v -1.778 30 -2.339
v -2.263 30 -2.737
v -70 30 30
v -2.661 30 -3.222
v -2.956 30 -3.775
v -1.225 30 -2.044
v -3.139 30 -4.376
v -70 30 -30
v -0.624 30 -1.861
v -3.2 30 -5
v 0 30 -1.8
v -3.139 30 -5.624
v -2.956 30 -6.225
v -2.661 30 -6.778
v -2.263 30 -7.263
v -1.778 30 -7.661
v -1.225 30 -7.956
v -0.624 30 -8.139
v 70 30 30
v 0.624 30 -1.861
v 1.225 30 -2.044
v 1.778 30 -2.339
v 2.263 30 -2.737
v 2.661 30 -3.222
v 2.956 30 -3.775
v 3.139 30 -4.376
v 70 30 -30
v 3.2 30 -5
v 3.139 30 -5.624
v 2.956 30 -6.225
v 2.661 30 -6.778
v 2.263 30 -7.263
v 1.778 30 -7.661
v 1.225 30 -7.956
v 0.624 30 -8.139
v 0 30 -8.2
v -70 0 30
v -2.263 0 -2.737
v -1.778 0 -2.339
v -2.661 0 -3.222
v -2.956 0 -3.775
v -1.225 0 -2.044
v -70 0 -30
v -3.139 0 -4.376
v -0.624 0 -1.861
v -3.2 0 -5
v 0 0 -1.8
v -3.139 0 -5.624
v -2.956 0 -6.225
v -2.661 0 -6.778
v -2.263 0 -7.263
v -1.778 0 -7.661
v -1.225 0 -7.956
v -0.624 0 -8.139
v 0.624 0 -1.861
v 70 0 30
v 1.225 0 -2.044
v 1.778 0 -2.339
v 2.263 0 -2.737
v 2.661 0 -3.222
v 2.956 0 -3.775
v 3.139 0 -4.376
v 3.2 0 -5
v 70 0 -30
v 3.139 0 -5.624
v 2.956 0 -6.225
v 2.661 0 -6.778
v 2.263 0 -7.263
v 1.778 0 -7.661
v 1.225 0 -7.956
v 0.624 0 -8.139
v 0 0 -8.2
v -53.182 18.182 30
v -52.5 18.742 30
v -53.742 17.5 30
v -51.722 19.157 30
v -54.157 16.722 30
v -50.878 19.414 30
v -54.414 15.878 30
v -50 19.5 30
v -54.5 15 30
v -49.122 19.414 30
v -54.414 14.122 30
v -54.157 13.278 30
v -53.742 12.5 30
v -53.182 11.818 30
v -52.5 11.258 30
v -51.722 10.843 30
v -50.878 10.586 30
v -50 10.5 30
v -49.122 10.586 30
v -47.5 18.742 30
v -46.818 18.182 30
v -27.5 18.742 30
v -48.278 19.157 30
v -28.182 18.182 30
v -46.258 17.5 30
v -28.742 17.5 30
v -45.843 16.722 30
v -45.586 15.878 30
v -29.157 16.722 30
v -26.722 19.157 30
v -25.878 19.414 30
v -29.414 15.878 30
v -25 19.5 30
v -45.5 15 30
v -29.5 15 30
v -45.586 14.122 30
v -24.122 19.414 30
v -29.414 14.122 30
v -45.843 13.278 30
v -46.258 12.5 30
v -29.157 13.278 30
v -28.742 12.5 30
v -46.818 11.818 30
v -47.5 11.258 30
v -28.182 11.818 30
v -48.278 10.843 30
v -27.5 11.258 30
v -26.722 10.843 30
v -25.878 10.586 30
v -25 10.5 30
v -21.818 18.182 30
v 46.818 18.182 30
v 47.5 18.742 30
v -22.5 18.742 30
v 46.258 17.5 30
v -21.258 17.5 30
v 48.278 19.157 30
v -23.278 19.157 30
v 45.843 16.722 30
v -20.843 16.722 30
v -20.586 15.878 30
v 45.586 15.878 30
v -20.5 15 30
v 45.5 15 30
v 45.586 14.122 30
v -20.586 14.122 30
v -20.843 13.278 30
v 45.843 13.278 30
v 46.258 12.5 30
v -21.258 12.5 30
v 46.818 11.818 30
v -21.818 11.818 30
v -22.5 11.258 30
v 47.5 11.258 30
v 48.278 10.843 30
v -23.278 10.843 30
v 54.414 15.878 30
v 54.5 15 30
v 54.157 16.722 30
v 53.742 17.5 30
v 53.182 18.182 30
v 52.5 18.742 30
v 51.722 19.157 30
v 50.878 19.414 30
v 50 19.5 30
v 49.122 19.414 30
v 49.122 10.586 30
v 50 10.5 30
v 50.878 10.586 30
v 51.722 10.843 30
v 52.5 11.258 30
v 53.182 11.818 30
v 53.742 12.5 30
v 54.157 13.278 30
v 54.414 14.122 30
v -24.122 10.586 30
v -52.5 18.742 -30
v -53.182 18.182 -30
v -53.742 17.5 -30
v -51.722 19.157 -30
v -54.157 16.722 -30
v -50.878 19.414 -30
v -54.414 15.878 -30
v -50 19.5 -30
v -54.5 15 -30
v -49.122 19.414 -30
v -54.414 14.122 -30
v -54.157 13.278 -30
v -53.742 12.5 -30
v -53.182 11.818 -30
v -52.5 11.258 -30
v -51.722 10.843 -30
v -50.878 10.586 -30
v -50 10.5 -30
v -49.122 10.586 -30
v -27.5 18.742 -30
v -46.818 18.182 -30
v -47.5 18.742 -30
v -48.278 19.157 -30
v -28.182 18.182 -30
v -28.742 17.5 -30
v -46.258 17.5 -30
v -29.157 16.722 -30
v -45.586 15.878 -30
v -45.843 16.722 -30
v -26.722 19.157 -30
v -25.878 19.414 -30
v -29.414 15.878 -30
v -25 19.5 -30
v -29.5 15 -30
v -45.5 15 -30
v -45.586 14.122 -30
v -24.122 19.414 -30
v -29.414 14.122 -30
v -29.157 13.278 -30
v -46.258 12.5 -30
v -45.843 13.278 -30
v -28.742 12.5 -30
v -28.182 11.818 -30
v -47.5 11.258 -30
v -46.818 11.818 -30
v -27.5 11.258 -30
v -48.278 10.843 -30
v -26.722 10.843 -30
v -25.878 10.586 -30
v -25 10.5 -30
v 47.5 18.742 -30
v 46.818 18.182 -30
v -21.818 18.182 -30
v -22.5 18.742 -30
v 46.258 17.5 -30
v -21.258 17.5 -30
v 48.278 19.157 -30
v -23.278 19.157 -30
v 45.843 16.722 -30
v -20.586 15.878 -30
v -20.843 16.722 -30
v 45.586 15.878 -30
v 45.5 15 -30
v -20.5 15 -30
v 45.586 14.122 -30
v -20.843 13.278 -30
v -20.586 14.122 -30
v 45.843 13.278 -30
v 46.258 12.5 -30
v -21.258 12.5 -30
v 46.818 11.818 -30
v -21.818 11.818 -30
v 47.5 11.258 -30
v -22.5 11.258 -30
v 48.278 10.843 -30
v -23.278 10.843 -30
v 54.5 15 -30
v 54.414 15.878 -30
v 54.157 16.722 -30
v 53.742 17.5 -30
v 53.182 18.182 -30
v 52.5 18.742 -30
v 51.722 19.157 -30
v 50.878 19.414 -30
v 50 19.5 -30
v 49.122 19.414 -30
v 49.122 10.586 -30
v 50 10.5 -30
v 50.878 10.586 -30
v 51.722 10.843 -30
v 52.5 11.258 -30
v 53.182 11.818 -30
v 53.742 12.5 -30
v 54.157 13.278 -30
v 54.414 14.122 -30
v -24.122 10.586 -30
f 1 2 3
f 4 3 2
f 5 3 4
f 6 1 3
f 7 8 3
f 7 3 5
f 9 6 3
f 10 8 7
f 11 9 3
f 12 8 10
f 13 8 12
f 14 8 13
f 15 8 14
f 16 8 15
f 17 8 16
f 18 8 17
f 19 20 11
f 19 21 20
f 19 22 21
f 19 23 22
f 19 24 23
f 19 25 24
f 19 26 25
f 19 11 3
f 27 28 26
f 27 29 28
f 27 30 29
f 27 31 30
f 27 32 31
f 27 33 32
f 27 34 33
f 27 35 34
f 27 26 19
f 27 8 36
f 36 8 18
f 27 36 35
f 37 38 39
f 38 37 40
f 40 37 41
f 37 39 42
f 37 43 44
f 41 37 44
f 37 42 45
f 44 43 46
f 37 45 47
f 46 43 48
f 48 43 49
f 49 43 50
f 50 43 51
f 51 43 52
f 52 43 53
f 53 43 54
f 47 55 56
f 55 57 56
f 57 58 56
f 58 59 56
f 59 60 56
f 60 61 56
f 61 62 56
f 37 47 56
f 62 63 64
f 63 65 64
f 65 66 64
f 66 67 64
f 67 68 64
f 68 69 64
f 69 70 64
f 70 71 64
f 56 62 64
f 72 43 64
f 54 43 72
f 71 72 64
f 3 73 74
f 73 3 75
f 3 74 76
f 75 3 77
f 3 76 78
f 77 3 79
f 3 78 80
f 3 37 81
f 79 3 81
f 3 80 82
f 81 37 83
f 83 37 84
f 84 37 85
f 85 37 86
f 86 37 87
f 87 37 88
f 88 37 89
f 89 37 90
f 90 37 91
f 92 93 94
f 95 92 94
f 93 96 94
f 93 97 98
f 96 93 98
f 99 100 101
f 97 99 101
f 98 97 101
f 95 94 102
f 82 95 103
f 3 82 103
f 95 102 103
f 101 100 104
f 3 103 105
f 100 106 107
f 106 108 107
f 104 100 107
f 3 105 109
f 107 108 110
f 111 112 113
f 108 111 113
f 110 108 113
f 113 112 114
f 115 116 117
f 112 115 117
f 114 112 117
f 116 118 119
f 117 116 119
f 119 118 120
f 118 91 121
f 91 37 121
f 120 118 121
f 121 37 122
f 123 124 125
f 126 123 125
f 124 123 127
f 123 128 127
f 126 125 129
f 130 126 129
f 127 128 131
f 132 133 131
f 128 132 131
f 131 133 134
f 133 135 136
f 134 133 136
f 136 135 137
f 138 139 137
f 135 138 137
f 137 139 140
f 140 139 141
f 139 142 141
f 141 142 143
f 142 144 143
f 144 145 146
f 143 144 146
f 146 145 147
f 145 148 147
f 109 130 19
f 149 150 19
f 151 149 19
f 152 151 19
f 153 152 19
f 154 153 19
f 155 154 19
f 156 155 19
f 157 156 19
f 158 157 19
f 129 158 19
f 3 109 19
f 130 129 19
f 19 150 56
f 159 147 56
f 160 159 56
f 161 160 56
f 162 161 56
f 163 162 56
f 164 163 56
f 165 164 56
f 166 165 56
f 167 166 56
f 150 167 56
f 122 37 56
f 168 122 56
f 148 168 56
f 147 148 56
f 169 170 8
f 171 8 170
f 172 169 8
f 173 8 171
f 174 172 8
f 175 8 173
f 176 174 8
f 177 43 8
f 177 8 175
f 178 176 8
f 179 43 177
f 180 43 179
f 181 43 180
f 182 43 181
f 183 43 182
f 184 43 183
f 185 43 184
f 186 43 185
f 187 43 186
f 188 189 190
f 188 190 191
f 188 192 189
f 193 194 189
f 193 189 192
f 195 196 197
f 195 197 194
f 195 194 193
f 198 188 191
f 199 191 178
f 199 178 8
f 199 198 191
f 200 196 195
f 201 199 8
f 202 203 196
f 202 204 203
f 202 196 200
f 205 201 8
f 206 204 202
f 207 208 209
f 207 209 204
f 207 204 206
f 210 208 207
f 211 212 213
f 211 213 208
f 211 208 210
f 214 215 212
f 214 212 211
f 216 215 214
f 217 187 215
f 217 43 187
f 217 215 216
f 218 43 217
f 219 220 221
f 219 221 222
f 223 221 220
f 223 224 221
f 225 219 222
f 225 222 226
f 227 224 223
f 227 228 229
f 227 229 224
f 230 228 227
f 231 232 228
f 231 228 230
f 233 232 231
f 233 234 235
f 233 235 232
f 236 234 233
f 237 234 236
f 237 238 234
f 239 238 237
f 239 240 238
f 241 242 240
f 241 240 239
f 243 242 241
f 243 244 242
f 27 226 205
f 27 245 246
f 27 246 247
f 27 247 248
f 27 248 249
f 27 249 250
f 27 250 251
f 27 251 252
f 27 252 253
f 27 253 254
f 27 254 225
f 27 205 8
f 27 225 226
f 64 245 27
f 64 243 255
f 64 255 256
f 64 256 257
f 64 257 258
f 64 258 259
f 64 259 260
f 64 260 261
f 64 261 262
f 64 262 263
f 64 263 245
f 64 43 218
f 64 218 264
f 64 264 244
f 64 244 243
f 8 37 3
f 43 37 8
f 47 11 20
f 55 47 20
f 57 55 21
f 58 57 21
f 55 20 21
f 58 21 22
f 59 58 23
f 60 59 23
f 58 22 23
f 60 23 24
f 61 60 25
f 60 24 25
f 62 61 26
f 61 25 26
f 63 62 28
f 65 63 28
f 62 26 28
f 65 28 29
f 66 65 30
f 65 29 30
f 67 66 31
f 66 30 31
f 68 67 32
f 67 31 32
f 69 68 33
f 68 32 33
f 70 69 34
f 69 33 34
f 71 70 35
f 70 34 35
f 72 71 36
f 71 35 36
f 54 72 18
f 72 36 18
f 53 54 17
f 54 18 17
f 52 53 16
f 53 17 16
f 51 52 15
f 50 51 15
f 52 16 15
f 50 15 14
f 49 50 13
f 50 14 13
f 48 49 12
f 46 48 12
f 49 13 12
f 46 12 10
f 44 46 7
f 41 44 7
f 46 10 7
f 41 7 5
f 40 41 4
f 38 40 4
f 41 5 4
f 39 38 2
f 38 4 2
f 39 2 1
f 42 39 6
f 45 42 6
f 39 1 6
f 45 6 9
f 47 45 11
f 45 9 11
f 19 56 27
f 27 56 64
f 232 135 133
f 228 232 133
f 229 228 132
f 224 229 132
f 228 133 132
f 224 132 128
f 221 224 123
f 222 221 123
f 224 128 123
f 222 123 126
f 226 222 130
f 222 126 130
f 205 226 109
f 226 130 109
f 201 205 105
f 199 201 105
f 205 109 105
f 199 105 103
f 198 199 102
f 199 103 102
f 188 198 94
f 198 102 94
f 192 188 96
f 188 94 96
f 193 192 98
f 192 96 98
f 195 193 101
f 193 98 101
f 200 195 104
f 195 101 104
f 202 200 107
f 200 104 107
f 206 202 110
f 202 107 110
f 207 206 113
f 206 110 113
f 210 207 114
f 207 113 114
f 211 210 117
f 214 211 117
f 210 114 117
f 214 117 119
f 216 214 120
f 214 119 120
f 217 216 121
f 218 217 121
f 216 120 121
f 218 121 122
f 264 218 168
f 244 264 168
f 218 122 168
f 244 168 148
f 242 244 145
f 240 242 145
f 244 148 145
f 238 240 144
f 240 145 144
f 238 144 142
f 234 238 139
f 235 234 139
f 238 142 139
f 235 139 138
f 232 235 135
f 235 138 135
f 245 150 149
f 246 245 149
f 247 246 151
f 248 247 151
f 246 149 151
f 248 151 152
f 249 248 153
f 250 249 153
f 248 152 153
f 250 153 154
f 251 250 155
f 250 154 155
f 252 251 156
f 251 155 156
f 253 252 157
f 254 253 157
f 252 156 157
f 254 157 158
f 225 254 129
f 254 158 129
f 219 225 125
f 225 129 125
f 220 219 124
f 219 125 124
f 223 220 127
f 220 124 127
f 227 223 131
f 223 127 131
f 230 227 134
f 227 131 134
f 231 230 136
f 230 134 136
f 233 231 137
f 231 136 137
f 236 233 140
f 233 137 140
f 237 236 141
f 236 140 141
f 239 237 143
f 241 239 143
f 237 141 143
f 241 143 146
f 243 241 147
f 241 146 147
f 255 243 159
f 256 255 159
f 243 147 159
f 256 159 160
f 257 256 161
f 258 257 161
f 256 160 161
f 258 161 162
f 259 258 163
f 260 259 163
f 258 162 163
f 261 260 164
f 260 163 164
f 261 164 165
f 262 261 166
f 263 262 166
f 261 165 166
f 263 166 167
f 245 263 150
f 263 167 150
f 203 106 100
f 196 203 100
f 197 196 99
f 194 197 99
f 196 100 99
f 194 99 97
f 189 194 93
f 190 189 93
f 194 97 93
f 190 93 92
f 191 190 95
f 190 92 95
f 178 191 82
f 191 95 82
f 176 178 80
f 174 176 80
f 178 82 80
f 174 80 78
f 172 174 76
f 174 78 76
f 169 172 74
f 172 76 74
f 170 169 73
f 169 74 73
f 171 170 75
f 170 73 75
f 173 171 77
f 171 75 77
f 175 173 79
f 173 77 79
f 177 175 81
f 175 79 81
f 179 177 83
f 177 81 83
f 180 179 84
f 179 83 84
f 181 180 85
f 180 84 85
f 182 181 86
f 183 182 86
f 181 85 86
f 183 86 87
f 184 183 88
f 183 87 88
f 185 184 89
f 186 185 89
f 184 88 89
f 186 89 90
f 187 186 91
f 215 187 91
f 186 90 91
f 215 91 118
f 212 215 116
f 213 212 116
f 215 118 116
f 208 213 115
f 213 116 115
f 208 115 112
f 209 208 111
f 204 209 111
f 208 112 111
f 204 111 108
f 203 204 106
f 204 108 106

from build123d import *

# Parameters (mm, degrees)
SKETCH1_W           = 140
SKETCH1_H           = 60
BOSS_EXTRUDE1_DEPTH = 30
SKETCH2_R           = 4.5
CUT_EXTRUDE1_DEPTH  = 60
SKETCH3_R           = 3.2
CUT_EXTRUDE2_DEPTH  = 30


with BuildPart() as part:
    # Sketch1 → Boss-Extrude1 (new body)
    with BuildSketch(Plane(origin=(0, 0, 0), x_dir=(1, 0, 0), z_dir=(0, 1, 0))):
        Rectangle(SKETCH1_W, SKETCH1_H)
    extrude(amount=BOSS_EXTRUDE1_DEPTH)

    # Sketch2 → Cut-Extrude1 (cut)
    with BuildSketch(Plane.XY.offset(30)):
        with Locations((50, 15)):
            Circle(SKETCH2_R)
        with Locations((-50, 15)):
            Circle(SKETCH2_R)
        with Locations((-25, 15)):
            Circle(SKETCH2_R)
    extrude(amount=-CUT_EXTRUDE1_DEPTH, mode=Mode.SUBTRACT)

    # Sketch3 → Cut-Extrude2 (cut)
    with BuildSketch(Plane(origin=(0, 30, 0), x_dir=(1, 0, 0), z_dir=(0, 1, 0))):
        with Locations(Location((0, 5, 0), (0, 0, 270))):
            Circle(SKETCH3_R)
    extrude(amount=-CUT_EXTRUDE2_DEPTH, mode=Mode.SUBTRACT)


solid = part.part
